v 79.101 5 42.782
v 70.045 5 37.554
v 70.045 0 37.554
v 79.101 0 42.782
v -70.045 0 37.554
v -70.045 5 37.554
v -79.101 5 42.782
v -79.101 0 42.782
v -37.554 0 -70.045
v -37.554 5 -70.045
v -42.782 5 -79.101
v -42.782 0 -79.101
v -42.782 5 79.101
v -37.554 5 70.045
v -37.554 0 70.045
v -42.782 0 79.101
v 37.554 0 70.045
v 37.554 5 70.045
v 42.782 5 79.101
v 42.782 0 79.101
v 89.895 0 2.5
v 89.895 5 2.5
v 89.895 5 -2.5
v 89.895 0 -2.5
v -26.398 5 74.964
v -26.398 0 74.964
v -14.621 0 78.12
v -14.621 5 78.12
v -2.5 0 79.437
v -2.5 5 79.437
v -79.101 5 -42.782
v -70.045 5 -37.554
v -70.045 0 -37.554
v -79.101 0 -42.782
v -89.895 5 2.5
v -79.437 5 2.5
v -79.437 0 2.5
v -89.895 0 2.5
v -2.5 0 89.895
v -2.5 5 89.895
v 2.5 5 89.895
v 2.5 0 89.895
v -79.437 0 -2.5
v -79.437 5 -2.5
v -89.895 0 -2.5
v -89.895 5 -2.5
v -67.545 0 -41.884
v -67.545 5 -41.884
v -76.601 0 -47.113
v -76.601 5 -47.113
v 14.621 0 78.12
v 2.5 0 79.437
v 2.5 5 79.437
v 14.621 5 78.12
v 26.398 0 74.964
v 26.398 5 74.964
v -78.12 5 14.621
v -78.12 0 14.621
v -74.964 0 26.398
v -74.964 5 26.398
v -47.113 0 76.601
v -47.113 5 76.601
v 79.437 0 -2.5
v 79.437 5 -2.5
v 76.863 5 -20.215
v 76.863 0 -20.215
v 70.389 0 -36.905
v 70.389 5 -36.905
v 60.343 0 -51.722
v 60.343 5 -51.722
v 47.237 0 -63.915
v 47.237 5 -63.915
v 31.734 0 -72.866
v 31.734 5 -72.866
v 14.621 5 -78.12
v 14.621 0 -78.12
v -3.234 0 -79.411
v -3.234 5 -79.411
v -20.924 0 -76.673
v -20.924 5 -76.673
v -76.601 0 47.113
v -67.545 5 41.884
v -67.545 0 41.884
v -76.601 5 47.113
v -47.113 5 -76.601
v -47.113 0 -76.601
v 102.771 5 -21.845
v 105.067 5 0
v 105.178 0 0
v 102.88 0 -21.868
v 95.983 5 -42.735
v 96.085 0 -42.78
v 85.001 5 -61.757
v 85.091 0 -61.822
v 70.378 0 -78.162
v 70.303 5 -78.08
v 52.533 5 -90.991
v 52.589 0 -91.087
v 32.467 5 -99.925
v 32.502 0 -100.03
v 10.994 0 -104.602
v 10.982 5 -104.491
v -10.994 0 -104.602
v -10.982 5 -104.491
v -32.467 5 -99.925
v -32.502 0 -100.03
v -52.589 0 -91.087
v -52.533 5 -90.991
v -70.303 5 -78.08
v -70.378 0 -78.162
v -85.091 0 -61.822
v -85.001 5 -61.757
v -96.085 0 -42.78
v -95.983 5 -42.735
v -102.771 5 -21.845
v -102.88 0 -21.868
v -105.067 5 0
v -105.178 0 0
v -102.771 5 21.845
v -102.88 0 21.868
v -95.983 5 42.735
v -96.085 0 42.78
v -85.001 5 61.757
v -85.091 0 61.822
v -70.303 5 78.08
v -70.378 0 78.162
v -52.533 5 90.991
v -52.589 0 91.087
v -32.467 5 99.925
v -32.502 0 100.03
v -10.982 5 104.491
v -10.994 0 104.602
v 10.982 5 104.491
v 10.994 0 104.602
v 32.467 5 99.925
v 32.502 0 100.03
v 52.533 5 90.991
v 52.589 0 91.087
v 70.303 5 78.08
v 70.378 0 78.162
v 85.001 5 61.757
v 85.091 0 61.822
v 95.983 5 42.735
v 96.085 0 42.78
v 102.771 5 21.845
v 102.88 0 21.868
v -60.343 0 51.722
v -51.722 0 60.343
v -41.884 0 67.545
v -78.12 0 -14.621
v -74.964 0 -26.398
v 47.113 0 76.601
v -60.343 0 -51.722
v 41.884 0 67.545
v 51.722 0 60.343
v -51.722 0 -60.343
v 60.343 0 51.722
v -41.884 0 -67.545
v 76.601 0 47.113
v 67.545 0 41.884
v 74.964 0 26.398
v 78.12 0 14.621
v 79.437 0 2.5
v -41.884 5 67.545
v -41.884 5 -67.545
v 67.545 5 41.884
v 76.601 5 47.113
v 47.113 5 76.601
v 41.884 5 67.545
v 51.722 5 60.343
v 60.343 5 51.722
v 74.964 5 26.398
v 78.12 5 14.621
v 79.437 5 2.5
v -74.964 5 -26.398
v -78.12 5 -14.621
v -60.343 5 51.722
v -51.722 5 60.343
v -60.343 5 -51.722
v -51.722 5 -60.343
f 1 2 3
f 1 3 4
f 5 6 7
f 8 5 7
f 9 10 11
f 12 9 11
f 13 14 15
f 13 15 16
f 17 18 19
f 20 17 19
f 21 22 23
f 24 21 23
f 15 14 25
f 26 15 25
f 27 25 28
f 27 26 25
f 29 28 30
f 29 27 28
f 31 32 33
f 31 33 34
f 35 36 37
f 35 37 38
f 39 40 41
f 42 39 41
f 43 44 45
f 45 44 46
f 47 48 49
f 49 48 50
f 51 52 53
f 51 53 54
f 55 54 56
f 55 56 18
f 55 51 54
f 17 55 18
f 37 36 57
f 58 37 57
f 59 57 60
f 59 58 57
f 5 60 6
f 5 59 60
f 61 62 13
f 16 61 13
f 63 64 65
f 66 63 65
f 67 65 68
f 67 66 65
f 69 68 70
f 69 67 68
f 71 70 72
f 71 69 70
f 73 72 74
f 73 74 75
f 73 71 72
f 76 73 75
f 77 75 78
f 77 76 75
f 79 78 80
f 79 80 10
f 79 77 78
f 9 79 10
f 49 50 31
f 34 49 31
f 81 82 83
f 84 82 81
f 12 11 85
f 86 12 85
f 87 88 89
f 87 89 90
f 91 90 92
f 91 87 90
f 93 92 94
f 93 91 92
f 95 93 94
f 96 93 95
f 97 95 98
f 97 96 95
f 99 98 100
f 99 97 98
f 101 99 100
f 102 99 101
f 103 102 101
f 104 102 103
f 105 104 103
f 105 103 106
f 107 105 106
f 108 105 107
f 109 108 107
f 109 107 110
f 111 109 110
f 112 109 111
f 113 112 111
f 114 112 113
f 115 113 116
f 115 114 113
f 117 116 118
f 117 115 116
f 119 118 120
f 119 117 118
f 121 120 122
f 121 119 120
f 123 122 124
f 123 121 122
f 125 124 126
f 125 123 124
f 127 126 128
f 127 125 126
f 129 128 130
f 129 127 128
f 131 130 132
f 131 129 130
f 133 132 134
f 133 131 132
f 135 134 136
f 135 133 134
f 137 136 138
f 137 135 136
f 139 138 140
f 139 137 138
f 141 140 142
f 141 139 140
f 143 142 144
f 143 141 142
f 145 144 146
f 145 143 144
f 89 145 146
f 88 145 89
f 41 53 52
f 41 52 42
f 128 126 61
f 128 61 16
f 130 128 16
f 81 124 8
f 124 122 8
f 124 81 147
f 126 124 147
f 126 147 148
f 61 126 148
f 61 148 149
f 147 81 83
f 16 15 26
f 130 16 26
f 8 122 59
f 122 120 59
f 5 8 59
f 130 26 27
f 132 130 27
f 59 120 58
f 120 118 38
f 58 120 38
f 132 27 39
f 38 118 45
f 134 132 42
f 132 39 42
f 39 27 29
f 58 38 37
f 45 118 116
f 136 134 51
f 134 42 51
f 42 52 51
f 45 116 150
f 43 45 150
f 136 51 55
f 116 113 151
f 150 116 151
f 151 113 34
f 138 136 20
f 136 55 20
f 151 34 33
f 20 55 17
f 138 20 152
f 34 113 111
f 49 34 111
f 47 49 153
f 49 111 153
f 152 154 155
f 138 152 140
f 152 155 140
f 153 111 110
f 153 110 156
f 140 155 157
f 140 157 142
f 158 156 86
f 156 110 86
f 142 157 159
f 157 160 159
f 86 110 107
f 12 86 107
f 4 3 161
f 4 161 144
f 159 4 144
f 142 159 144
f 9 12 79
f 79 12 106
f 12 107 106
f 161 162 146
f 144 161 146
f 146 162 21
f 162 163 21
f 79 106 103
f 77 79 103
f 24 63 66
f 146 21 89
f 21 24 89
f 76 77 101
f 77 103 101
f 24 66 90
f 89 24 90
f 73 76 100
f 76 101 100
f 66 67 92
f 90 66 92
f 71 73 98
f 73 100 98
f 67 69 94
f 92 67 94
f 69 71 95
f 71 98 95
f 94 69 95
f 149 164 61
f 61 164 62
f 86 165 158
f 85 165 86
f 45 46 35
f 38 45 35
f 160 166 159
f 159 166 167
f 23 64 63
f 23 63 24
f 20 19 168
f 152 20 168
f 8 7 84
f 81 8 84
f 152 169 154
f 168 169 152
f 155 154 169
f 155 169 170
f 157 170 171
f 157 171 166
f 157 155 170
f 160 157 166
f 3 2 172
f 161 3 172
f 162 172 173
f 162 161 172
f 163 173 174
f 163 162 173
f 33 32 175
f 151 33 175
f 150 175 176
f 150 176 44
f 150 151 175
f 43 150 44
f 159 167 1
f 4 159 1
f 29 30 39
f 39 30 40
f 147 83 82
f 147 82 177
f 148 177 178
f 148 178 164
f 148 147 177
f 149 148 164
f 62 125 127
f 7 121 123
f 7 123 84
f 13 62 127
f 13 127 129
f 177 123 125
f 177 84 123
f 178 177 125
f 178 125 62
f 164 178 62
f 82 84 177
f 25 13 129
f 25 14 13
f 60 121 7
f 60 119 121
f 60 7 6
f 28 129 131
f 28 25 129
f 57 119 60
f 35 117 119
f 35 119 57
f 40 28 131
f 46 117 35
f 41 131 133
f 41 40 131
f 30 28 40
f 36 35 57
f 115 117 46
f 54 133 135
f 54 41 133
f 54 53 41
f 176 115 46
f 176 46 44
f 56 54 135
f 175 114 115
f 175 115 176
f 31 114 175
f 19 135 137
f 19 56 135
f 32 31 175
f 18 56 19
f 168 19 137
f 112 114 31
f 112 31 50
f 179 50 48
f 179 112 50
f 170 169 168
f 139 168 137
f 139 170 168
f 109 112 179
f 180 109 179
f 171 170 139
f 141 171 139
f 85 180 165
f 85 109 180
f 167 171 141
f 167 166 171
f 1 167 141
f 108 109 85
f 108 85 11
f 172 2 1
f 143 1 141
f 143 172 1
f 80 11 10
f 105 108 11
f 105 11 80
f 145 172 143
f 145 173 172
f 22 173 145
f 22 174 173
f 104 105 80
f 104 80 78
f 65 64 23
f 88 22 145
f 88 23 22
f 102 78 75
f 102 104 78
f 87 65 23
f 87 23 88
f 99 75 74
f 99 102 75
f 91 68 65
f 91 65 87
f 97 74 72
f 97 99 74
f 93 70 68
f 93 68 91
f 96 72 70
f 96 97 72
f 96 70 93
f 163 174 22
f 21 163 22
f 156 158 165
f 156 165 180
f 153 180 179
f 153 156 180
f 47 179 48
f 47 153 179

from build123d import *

# Parameters (mm, degrees)
SKETCH1_R           = 105.177936238
SKETCH1_R_2         = 79.476526286
BOSS_EXTRUDE1_DEPTH = 5
SKETCH3_W           = 25.87147266
SKETCH3_H           = 5
CUT_EXTRUDE1_DEPTH  = 5
CIRPATTERN1_COUNT   = 9
CIRPATTERN1_ANGLE   = 240


with BuildPart() as part:
    # Sketch1 → Boss-Extrude1 (new body)
    with BuildSketch(Plane(origin=(0, 0, 0), x_dir=(1, 0, 0), z_dir=(0, 1, 0))):
        Circle(SKETCH1_R)
        Circle(SKETCH1_R_2, mode=Mode.SUBTRACT)
    extrude(amount=BOSS_EXTRUDE1_DEPTH)

    # Sketch2 → Cut-Revolve1 (revolve, cut)
    with BuildSketch(Plane.XY):
        Polygon((105.177936238, 0), (105.037977295, 6.300404607), (110.743312601, 6.300404607), (110.743312601, 0), align=None)
    revolve(axis=Axis((0, 0, 0), (0, 1, 0)), mode=Mode.SUBTRACT)

    # Sketch3 → Cut-Extrude1 (cut)
    with BuildSketch(Plane(origin=(0, 5, 0), x_dir=(1, 0, 0), z_dir=(0, 1, 0))):
        with Locations((76.959203751, 0)):
            Rectangle(SKETCH3_W, SKETCH3_H)
    cut_extrude1 = extrude(amount=-CUT_EXTRUDE1_DEPTH, mode=Mode.SUBTRACT)

    # CirPattern1: Cut-Extrude1 ×9 about axis
    cirpattern1_axis = Axis((0, 0, 0), (0, -1, 0))
    for i in range(1, CIRPATTERN1_COUNT):
        add(cut_extrude1.rotate(cirpattern1_axis, i * CIRPATTERN1_ANGLE / (CIRPATTERN1_COUNT - 1)), mode=Mode.SUBTRACT)


solid = part.part
